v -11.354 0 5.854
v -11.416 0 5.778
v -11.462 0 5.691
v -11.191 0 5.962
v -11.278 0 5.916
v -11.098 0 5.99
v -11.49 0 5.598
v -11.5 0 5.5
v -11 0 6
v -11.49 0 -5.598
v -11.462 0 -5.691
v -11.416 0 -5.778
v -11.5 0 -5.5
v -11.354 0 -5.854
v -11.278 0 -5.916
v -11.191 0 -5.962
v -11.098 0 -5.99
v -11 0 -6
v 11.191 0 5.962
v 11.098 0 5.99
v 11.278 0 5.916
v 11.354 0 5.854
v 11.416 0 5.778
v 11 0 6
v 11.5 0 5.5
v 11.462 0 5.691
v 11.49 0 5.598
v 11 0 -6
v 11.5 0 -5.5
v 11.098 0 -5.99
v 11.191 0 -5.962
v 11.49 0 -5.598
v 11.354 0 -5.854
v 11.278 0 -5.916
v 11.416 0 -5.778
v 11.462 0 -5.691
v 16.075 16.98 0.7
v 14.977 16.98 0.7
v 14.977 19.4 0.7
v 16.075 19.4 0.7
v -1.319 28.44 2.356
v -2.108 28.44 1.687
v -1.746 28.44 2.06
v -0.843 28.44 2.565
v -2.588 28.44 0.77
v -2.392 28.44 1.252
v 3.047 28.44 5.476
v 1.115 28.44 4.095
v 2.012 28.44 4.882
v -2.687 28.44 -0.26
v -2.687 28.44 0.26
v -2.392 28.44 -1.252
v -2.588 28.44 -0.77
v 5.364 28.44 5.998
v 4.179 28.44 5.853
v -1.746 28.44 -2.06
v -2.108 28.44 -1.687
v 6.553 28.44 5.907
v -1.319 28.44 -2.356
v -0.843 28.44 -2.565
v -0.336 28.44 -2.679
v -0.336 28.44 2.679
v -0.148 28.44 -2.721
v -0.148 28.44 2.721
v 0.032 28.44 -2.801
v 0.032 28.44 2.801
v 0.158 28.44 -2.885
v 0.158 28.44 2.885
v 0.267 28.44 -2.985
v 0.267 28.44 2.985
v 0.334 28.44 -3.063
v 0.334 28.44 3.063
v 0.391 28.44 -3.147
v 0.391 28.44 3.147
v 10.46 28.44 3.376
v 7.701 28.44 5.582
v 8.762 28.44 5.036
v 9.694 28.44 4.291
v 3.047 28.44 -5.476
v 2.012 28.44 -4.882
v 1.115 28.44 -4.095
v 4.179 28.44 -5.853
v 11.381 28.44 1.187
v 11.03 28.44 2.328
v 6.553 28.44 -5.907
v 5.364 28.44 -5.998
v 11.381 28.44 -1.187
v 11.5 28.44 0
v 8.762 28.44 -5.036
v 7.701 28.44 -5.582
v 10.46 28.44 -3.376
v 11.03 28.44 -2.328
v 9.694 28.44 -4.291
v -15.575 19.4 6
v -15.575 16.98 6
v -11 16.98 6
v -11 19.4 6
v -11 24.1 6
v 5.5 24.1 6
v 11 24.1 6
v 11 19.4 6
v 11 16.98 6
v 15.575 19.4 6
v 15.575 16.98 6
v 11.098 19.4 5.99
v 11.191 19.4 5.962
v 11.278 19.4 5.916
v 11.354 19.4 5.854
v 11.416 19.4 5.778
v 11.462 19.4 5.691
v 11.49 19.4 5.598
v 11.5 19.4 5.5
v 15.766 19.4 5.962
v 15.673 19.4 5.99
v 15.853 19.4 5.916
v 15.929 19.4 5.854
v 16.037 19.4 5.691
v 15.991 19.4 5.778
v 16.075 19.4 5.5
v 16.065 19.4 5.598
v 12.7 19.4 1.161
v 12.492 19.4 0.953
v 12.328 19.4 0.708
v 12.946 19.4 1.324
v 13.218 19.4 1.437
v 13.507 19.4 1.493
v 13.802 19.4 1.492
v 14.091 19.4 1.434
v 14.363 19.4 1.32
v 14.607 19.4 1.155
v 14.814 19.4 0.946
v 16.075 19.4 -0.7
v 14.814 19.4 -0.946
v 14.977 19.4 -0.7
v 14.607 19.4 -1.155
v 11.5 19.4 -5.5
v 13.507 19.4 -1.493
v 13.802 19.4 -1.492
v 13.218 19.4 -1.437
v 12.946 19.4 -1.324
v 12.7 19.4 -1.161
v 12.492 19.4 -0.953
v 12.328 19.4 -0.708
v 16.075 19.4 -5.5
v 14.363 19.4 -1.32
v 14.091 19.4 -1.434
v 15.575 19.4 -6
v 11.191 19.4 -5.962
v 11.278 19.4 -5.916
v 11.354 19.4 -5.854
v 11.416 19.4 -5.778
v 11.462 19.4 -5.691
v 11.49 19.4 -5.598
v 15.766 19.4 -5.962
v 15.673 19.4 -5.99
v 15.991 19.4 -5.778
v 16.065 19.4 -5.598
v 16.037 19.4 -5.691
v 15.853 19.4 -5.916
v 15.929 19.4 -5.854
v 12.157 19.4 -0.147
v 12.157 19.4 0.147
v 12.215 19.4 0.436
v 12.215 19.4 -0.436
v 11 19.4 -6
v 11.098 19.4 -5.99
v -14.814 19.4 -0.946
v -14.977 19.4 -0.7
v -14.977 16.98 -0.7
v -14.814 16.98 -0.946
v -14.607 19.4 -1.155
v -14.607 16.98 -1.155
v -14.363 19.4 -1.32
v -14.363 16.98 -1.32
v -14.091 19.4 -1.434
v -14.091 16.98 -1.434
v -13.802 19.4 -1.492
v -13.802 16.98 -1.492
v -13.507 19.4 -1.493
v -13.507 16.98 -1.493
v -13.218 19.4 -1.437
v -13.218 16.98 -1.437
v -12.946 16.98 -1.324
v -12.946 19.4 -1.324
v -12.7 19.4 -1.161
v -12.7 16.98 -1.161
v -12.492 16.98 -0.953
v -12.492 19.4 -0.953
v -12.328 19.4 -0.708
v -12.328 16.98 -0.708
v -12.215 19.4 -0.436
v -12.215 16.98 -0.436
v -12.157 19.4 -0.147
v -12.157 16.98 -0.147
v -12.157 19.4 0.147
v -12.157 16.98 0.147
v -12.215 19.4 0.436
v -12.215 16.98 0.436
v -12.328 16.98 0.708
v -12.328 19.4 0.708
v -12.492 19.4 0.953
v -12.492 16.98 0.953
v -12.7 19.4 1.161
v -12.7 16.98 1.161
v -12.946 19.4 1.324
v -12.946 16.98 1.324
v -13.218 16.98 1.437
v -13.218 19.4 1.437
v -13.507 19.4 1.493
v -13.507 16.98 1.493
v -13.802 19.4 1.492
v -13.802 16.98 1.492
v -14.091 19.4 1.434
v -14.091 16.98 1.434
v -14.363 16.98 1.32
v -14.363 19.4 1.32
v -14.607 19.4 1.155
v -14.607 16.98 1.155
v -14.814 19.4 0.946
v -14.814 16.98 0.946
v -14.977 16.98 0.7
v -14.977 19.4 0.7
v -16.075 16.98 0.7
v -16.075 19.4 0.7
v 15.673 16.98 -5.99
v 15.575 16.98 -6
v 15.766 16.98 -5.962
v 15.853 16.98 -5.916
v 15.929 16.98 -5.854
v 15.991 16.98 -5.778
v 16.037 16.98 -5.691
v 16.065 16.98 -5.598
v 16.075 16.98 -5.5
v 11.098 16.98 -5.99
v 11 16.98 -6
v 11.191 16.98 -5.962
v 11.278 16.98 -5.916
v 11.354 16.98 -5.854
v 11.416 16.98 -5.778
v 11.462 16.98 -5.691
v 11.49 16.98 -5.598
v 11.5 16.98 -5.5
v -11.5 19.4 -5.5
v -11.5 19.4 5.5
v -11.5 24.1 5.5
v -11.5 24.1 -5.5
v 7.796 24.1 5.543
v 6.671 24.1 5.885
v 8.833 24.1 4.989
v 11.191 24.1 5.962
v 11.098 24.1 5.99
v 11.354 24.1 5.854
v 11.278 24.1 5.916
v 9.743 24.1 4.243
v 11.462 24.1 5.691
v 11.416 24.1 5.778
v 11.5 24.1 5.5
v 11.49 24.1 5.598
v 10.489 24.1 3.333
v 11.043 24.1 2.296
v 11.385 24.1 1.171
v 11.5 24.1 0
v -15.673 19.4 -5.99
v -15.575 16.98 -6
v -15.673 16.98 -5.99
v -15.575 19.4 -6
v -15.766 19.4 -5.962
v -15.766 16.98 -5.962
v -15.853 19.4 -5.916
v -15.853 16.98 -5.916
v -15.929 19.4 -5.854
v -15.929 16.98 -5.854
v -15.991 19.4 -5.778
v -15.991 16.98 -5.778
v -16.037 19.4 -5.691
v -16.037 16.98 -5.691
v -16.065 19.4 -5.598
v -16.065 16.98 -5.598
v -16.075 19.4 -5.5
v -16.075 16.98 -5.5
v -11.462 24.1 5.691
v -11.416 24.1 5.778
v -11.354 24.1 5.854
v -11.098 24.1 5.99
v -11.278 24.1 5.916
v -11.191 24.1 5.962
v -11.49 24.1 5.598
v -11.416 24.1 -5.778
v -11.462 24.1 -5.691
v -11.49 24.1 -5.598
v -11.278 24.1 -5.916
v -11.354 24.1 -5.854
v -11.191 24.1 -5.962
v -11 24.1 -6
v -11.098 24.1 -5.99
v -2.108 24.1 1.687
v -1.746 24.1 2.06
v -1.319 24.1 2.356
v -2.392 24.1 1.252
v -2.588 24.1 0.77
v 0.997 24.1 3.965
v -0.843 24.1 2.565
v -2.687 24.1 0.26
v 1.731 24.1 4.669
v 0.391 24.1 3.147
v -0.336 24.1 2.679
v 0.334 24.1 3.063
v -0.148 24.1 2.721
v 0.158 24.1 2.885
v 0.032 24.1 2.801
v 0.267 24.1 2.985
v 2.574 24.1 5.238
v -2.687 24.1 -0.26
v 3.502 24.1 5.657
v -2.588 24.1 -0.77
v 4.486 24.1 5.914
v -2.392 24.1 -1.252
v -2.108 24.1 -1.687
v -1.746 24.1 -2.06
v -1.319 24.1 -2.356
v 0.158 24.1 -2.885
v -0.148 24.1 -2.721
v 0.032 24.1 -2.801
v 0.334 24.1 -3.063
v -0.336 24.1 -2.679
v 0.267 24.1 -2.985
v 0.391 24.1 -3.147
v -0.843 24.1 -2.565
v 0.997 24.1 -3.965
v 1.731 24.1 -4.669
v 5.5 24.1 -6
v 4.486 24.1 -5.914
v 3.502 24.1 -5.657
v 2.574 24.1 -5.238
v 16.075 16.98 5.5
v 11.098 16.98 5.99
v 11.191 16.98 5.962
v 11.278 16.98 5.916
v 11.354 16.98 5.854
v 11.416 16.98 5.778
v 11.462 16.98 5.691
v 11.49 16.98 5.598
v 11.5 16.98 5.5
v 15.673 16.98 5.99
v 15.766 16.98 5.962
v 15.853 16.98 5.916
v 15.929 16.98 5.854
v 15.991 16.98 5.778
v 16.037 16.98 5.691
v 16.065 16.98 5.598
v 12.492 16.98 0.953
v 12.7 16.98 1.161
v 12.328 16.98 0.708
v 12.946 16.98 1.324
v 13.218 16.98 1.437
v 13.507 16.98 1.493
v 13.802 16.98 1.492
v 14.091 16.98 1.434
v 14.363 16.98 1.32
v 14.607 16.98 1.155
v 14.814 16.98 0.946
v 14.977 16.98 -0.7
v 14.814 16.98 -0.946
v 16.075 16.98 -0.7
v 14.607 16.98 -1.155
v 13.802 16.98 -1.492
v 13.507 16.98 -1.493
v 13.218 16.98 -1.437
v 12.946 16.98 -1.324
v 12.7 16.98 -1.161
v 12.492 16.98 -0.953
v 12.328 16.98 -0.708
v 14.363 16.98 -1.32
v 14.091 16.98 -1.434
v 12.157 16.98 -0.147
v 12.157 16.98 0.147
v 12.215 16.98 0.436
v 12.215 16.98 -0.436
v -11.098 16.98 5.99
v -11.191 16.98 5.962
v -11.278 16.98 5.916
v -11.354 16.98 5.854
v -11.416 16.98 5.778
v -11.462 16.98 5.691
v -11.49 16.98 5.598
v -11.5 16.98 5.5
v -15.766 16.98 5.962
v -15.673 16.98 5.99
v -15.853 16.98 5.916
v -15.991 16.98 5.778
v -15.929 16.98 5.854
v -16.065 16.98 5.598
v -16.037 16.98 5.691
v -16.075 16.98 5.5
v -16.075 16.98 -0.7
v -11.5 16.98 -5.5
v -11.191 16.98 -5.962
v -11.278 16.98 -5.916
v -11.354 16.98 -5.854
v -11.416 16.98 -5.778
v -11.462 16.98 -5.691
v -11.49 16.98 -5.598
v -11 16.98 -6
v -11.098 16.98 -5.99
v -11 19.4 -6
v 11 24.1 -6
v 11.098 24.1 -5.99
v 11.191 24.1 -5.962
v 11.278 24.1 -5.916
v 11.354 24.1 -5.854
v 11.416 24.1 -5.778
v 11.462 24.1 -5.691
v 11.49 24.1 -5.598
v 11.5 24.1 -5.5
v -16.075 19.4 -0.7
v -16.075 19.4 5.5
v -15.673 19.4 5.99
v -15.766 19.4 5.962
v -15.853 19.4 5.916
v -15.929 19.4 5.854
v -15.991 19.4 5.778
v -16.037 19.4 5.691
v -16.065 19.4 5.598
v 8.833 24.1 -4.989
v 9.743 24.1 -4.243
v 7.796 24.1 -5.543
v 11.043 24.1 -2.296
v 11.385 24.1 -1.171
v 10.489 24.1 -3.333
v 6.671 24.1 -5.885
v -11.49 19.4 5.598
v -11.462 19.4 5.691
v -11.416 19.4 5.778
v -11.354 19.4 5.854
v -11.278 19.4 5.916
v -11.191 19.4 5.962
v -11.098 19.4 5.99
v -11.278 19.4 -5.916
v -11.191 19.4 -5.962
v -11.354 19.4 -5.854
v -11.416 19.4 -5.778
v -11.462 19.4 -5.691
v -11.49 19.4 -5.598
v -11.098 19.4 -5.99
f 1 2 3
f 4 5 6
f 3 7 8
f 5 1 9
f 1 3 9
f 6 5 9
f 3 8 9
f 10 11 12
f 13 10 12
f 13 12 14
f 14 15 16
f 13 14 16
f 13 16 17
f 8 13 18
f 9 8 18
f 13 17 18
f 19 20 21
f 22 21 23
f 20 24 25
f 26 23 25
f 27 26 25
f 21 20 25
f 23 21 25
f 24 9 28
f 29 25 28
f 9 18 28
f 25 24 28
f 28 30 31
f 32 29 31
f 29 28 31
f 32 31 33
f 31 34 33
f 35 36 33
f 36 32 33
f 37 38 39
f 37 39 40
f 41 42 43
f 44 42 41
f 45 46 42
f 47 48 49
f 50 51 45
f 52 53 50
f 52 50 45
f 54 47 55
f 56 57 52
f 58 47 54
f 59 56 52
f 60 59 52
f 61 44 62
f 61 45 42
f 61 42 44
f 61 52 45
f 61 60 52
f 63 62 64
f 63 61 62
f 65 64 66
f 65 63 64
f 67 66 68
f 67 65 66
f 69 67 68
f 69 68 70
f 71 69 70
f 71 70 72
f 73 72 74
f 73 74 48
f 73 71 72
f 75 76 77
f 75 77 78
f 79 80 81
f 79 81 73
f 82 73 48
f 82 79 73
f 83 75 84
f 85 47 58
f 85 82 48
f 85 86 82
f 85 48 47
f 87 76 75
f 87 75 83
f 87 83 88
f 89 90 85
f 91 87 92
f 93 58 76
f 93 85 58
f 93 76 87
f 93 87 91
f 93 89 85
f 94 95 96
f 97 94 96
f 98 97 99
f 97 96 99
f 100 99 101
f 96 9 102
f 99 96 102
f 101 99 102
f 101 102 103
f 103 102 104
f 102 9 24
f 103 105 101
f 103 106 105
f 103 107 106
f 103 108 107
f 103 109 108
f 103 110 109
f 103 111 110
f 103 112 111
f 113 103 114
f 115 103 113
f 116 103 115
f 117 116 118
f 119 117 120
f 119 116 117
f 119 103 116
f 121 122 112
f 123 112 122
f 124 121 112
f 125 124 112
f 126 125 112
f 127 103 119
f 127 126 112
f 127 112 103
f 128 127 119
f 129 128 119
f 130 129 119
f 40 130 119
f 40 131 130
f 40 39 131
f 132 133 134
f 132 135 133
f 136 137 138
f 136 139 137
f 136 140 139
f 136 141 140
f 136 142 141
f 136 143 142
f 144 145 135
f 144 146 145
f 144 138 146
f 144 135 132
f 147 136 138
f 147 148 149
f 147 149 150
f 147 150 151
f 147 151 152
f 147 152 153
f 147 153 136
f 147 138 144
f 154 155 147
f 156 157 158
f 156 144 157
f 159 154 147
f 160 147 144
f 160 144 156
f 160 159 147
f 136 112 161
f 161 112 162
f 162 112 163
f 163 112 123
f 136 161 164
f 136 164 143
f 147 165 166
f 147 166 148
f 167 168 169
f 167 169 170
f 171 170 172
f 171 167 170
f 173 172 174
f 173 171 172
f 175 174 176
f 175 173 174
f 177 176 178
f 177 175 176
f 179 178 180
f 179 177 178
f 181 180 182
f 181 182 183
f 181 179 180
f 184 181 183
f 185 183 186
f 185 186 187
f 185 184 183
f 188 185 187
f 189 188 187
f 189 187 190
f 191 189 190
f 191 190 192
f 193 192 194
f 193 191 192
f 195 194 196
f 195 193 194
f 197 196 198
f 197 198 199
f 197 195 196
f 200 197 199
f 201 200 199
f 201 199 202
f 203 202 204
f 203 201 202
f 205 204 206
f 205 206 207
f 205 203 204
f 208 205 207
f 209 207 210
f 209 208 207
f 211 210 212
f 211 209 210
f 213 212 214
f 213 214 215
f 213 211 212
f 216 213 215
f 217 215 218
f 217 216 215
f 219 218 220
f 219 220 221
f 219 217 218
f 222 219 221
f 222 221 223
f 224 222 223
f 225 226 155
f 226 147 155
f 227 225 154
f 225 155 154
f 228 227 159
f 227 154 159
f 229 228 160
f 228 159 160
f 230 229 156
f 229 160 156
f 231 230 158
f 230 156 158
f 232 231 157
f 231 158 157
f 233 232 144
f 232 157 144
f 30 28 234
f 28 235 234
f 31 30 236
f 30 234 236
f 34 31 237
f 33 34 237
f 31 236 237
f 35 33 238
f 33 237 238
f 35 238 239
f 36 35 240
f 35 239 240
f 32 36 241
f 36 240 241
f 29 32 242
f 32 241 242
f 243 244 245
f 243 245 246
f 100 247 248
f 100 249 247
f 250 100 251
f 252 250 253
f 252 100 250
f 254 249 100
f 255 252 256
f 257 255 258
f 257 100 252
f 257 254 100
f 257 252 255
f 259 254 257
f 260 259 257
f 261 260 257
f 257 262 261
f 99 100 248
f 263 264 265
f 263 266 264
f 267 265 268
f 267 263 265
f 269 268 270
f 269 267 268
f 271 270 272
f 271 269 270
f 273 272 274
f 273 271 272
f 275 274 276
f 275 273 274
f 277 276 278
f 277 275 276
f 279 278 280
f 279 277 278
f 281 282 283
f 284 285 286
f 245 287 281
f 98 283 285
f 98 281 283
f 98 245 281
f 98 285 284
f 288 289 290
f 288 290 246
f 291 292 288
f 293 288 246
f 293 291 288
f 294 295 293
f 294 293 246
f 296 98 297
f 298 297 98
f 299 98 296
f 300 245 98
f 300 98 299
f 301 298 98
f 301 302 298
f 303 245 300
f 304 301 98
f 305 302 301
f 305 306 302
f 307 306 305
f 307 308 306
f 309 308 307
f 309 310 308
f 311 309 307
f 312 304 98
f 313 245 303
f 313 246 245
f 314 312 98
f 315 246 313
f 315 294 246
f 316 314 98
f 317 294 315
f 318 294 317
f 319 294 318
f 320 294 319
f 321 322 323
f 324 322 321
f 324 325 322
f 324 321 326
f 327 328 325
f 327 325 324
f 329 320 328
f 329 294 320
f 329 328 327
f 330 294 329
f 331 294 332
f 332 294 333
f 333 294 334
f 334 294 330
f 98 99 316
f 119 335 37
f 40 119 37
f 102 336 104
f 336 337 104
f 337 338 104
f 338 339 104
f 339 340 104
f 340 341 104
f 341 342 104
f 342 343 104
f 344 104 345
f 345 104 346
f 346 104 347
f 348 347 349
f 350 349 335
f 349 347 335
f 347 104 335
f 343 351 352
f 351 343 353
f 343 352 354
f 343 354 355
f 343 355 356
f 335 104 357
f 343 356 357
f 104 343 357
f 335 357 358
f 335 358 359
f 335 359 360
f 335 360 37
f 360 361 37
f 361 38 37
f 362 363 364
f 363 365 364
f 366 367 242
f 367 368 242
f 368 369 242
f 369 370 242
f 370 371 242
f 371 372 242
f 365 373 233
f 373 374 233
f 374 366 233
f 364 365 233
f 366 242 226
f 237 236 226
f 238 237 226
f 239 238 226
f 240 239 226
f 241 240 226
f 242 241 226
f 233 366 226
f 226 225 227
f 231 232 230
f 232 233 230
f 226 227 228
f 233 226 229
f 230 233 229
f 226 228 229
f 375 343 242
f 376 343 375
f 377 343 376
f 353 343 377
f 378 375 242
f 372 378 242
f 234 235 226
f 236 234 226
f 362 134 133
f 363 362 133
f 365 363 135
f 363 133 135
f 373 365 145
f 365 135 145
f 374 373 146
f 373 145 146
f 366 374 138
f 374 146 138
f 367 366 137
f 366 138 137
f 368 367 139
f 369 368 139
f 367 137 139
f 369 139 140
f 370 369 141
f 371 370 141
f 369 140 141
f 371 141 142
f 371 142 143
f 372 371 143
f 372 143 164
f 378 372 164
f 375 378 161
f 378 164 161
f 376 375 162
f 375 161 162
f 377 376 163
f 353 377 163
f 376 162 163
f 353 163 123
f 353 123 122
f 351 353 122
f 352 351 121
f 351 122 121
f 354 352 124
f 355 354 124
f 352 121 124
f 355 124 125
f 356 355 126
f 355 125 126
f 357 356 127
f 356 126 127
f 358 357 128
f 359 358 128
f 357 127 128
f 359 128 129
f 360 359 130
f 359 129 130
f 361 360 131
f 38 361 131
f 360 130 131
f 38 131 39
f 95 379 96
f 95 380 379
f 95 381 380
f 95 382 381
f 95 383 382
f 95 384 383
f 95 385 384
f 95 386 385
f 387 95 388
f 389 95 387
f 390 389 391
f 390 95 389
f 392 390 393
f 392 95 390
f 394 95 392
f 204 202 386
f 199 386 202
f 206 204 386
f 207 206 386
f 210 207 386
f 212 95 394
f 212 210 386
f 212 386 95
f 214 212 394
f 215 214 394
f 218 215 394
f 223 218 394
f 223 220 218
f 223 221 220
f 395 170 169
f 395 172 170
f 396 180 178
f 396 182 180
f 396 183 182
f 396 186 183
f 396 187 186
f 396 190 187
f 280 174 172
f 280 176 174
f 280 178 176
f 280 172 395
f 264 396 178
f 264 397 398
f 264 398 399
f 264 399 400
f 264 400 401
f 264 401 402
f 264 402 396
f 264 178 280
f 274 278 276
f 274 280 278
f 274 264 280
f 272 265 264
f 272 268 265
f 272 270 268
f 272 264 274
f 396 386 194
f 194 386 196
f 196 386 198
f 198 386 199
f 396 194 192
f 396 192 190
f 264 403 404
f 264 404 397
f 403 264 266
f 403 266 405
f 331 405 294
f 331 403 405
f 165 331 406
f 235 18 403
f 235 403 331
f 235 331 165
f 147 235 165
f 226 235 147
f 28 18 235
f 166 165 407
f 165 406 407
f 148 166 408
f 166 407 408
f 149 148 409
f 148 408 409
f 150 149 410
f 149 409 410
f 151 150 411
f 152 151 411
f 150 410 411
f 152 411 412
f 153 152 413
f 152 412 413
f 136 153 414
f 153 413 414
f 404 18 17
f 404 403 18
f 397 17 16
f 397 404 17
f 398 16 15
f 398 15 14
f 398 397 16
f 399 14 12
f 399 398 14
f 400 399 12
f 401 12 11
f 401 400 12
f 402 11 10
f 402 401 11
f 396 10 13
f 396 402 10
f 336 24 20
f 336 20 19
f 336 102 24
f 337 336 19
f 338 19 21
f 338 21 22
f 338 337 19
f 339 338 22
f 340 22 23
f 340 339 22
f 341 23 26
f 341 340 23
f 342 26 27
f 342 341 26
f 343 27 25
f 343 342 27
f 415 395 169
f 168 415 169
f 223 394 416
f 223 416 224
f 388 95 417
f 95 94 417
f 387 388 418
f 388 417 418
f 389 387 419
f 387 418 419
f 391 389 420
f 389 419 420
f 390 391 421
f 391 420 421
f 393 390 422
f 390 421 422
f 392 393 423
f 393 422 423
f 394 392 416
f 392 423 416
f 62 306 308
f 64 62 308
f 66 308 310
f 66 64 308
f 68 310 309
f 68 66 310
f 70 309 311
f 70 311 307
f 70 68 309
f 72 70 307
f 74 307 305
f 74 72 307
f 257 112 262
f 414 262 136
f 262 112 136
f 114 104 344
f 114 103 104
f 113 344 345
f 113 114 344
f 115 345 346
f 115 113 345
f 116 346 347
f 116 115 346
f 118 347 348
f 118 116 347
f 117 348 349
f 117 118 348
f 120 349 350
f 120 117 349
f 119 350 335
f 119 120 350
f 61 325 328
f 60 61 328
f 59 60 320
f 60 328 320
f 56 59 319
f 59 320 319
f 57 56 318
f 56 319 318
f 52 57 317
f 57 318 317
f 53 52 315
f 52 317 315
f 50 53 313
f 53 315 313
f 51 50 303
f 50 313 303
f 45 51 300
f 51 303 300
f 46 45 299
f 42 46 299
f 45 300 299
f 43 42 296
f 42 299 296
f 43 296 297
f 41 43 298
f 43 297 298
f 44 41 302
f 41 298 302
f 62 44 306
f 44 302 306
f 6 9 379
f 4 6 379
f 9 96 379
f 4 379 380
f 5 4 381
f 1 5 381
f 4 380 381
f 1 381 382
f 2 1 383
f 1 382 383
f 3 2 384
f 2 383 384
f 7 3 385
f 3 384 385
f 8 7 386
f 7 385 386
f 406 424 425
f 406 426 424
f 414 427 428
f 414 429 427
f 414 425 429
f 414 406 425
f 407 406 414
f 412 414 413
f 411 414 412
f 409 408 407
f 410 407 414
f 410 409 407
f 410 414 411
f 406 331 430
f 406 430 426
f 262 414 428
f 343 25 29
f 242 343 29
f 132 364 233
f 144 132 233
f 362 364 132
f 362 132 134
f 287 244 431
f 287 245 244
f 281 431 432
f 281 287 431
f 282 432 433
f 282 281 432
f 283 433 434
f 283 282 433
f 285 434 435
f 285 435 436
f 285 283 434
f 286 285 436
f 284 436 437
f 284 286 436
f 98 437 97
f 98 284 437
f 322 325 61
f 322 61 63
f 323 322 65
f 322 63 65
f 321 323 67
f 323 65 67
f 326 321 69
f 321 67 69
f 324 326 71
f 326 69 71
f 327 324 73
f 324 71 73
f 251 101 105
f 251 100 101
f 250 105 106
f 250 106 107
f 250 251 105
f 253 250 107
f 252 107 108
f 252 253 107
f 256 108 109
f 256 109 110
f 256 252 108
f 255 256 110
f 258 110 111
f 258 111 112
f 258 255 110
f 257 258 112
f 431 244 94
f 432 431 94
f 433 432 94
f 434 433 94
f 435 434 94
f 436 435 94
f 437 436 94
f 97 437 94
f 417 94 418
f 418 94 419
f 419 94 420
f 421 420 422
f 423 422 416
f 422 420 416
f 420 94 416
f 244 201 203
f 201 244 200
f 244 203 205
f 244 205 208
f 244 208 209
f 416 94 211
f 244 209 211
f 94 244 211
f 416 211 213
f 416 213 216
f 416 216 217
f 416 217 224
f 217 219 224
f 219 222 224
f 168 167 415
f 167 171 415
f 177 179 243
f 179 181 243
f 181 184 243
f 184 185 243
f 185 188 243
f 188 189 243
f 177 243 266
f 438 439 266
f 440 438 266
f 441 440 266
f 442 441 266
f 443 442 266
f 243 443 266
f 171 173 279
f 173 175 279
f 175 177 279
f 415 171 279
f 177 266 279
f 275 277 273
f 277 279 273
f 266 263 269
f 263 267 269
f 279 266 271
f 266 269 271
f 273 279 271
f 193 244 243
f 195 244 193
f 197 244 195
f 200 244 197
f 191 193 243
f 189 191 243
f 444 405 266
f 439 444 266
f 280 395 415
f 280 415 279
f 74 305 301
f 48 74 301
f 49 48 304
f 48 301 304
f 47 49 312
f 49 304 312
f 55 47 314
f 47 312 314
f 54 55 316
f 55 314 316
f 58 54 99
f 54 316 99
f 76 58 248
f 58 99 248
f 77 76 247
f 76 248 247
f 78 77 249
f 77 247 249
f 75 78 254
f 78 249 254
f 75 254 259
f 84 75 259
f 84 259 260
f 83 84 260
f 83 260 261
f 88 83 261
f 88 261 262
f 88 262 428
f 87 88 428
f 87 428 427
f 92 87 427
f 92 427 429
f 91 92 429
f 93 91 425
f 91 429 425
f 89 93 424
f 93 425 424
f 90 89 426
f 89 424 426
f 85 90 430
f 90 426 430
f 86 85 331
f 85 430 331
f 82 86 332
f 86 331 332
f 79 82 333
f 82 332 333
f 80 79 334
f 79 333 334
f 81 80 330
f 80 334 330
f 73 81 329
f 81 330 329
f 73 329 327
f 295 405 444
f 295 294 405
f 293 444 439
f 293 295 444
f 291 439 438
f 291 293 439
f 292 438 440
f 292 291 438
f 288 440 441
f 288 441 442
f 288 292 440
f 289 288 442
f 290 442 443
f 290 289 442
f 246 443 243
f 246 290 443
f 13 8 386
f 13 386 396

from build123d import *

# Parameters (mm, degrees)
SKETCH1_W           = 23
SKETCH1_H           = 12
BOSS_EXTRUDE1_DEPTH = 24.1
SKETCH2_R           = 6
SKETCH2_R_2         = 2.7
BOSS_EXTRUDE2_DEPTH = 4.34
BOSS_EXTRUDE4_START = 16.98
SKETCH4_W           = 4.575
SKETCH4_H           = 12
BOSS_EXTRUDE4_DEPTH = 2.42
SKETCH5_R           = 1.5
CUT_EXTRUDE1_DEPTH  = 2.42
FILLET1_R           = 1
FILLET2_R           = 0.5


with BuildPart() as part:
    # Sketch1 → Boss-Extrude1 (new body)
    with BuildSketch(Plane(origin=(0, 0, 0), x_dir=(1, 0, 0), z_dir=(0, 1, 0))):
        Rectangle(SKETCH1_W, SKETCH1_H)
    extrude(amount=BOSS_EXTRUDE1_DEPTH)

    # Sketch2 → Boss-Extrude2 (add)
    with BuildSketch(Plane(origin=(0, 24.1, 0), x_dir=(1, 0, 0), z_dir=(0, 1, 0))):
        with Locations((5.5, 0)):
            Circle(SKETCH2_R)
        Circle(SKETCH2_R_2)
    extrude(amount=BOSS_EXTRUDE2_DEPTH)

    # Sketch4 → Boss-Extrude4 (add)
    with BuildSketch(Plane(origin=(0, 0, 0), x_dir=(1, 0, 0), z_dir=(0, 1, 0)).offset(BOSS_EXTRUDE4_START)):
        with Locations((13.7875, 0)):
            Rectangle(SKETCH4_W, SKETCH4_H)
    boss_extrude4 = extrude(amount=BOSS_EXTRUDE4_DEPTH)

    # Sketch5 → Cut-Extrude1 (cut)
    with BuildSketch(Plane(origin=(0, 19.4, 0), x_dir=(1, 0, 0), z_dir=(0, 1, 0))):
        with Locations((13.65, 0)):
            Circle(SKETCH5_R)
        with BuildLine():
            Line((16.075, 0.7), (14.976649916, 0.7))
            ThreePointArc((14.976649916, 0.7), (15.106017664, 0.360572549), (15.15, 0))
            ThreePointArc((15.15, 0), (15.106017664, -0.360572549), (14.976649916, -0.7))
            Line((14.976649916, -0.7), (16.075, -0.7))
            Line((16.075, -0.7), (16.075, 0.7))
        make_face()
    cut_extrude1 = extrude(amount=-CUT_EXTRUDE1_DEPTH, mode=Mode.SUBTRACT)

    # Mirror2: Boss-Extrude4, Cut-Extrude1 across plane
    add(boss_extrude4.mirror(Plane(origin=(0, 0, 0), x_dir=(0, 0, 1), z_dir=(1, 0, 0))))
    add(cut_extrude1.mirror(Plane(origin=(0, 0, 0), x_dir=(0, 0, 1), z_dir=(1, 0, 0))), mode=Mode.SUBTRACT)

    # Fillet1
    fillet1_edges = [part.edges().sort_by_distance(p)[0] for p in [
        (0.14, 26.27, -2.696367927),
        (0.14, 26.27, 2.696367927),
    ]]
    fillet(fillet1_edges, radius=FILLET1_R)

    # Fillet2
    fillet2_edges = [part.edges().sort_by_distance(p)[0] for p in [
        (11.5, 8.49, 6),
        (11.5, 8.49, -6),
        (16.075, 18.19, -6),
        (16.075, 18.19, 6),
        (-11.5, 8.49, 6),
        (-11.5, 8.49, -6),
        (-16.075, 18.19, -6),
        (-16.075, 18.19, 6),
        (11.5, 21.75, 6),
        (-11.5, 21.75, 6),
        (-11.5, 21.75, -6),
        (11.5, 21.75, -6),
    ]]
    fillet(fillet2_edges, radius=FILLET2_R)


solid = part.part
